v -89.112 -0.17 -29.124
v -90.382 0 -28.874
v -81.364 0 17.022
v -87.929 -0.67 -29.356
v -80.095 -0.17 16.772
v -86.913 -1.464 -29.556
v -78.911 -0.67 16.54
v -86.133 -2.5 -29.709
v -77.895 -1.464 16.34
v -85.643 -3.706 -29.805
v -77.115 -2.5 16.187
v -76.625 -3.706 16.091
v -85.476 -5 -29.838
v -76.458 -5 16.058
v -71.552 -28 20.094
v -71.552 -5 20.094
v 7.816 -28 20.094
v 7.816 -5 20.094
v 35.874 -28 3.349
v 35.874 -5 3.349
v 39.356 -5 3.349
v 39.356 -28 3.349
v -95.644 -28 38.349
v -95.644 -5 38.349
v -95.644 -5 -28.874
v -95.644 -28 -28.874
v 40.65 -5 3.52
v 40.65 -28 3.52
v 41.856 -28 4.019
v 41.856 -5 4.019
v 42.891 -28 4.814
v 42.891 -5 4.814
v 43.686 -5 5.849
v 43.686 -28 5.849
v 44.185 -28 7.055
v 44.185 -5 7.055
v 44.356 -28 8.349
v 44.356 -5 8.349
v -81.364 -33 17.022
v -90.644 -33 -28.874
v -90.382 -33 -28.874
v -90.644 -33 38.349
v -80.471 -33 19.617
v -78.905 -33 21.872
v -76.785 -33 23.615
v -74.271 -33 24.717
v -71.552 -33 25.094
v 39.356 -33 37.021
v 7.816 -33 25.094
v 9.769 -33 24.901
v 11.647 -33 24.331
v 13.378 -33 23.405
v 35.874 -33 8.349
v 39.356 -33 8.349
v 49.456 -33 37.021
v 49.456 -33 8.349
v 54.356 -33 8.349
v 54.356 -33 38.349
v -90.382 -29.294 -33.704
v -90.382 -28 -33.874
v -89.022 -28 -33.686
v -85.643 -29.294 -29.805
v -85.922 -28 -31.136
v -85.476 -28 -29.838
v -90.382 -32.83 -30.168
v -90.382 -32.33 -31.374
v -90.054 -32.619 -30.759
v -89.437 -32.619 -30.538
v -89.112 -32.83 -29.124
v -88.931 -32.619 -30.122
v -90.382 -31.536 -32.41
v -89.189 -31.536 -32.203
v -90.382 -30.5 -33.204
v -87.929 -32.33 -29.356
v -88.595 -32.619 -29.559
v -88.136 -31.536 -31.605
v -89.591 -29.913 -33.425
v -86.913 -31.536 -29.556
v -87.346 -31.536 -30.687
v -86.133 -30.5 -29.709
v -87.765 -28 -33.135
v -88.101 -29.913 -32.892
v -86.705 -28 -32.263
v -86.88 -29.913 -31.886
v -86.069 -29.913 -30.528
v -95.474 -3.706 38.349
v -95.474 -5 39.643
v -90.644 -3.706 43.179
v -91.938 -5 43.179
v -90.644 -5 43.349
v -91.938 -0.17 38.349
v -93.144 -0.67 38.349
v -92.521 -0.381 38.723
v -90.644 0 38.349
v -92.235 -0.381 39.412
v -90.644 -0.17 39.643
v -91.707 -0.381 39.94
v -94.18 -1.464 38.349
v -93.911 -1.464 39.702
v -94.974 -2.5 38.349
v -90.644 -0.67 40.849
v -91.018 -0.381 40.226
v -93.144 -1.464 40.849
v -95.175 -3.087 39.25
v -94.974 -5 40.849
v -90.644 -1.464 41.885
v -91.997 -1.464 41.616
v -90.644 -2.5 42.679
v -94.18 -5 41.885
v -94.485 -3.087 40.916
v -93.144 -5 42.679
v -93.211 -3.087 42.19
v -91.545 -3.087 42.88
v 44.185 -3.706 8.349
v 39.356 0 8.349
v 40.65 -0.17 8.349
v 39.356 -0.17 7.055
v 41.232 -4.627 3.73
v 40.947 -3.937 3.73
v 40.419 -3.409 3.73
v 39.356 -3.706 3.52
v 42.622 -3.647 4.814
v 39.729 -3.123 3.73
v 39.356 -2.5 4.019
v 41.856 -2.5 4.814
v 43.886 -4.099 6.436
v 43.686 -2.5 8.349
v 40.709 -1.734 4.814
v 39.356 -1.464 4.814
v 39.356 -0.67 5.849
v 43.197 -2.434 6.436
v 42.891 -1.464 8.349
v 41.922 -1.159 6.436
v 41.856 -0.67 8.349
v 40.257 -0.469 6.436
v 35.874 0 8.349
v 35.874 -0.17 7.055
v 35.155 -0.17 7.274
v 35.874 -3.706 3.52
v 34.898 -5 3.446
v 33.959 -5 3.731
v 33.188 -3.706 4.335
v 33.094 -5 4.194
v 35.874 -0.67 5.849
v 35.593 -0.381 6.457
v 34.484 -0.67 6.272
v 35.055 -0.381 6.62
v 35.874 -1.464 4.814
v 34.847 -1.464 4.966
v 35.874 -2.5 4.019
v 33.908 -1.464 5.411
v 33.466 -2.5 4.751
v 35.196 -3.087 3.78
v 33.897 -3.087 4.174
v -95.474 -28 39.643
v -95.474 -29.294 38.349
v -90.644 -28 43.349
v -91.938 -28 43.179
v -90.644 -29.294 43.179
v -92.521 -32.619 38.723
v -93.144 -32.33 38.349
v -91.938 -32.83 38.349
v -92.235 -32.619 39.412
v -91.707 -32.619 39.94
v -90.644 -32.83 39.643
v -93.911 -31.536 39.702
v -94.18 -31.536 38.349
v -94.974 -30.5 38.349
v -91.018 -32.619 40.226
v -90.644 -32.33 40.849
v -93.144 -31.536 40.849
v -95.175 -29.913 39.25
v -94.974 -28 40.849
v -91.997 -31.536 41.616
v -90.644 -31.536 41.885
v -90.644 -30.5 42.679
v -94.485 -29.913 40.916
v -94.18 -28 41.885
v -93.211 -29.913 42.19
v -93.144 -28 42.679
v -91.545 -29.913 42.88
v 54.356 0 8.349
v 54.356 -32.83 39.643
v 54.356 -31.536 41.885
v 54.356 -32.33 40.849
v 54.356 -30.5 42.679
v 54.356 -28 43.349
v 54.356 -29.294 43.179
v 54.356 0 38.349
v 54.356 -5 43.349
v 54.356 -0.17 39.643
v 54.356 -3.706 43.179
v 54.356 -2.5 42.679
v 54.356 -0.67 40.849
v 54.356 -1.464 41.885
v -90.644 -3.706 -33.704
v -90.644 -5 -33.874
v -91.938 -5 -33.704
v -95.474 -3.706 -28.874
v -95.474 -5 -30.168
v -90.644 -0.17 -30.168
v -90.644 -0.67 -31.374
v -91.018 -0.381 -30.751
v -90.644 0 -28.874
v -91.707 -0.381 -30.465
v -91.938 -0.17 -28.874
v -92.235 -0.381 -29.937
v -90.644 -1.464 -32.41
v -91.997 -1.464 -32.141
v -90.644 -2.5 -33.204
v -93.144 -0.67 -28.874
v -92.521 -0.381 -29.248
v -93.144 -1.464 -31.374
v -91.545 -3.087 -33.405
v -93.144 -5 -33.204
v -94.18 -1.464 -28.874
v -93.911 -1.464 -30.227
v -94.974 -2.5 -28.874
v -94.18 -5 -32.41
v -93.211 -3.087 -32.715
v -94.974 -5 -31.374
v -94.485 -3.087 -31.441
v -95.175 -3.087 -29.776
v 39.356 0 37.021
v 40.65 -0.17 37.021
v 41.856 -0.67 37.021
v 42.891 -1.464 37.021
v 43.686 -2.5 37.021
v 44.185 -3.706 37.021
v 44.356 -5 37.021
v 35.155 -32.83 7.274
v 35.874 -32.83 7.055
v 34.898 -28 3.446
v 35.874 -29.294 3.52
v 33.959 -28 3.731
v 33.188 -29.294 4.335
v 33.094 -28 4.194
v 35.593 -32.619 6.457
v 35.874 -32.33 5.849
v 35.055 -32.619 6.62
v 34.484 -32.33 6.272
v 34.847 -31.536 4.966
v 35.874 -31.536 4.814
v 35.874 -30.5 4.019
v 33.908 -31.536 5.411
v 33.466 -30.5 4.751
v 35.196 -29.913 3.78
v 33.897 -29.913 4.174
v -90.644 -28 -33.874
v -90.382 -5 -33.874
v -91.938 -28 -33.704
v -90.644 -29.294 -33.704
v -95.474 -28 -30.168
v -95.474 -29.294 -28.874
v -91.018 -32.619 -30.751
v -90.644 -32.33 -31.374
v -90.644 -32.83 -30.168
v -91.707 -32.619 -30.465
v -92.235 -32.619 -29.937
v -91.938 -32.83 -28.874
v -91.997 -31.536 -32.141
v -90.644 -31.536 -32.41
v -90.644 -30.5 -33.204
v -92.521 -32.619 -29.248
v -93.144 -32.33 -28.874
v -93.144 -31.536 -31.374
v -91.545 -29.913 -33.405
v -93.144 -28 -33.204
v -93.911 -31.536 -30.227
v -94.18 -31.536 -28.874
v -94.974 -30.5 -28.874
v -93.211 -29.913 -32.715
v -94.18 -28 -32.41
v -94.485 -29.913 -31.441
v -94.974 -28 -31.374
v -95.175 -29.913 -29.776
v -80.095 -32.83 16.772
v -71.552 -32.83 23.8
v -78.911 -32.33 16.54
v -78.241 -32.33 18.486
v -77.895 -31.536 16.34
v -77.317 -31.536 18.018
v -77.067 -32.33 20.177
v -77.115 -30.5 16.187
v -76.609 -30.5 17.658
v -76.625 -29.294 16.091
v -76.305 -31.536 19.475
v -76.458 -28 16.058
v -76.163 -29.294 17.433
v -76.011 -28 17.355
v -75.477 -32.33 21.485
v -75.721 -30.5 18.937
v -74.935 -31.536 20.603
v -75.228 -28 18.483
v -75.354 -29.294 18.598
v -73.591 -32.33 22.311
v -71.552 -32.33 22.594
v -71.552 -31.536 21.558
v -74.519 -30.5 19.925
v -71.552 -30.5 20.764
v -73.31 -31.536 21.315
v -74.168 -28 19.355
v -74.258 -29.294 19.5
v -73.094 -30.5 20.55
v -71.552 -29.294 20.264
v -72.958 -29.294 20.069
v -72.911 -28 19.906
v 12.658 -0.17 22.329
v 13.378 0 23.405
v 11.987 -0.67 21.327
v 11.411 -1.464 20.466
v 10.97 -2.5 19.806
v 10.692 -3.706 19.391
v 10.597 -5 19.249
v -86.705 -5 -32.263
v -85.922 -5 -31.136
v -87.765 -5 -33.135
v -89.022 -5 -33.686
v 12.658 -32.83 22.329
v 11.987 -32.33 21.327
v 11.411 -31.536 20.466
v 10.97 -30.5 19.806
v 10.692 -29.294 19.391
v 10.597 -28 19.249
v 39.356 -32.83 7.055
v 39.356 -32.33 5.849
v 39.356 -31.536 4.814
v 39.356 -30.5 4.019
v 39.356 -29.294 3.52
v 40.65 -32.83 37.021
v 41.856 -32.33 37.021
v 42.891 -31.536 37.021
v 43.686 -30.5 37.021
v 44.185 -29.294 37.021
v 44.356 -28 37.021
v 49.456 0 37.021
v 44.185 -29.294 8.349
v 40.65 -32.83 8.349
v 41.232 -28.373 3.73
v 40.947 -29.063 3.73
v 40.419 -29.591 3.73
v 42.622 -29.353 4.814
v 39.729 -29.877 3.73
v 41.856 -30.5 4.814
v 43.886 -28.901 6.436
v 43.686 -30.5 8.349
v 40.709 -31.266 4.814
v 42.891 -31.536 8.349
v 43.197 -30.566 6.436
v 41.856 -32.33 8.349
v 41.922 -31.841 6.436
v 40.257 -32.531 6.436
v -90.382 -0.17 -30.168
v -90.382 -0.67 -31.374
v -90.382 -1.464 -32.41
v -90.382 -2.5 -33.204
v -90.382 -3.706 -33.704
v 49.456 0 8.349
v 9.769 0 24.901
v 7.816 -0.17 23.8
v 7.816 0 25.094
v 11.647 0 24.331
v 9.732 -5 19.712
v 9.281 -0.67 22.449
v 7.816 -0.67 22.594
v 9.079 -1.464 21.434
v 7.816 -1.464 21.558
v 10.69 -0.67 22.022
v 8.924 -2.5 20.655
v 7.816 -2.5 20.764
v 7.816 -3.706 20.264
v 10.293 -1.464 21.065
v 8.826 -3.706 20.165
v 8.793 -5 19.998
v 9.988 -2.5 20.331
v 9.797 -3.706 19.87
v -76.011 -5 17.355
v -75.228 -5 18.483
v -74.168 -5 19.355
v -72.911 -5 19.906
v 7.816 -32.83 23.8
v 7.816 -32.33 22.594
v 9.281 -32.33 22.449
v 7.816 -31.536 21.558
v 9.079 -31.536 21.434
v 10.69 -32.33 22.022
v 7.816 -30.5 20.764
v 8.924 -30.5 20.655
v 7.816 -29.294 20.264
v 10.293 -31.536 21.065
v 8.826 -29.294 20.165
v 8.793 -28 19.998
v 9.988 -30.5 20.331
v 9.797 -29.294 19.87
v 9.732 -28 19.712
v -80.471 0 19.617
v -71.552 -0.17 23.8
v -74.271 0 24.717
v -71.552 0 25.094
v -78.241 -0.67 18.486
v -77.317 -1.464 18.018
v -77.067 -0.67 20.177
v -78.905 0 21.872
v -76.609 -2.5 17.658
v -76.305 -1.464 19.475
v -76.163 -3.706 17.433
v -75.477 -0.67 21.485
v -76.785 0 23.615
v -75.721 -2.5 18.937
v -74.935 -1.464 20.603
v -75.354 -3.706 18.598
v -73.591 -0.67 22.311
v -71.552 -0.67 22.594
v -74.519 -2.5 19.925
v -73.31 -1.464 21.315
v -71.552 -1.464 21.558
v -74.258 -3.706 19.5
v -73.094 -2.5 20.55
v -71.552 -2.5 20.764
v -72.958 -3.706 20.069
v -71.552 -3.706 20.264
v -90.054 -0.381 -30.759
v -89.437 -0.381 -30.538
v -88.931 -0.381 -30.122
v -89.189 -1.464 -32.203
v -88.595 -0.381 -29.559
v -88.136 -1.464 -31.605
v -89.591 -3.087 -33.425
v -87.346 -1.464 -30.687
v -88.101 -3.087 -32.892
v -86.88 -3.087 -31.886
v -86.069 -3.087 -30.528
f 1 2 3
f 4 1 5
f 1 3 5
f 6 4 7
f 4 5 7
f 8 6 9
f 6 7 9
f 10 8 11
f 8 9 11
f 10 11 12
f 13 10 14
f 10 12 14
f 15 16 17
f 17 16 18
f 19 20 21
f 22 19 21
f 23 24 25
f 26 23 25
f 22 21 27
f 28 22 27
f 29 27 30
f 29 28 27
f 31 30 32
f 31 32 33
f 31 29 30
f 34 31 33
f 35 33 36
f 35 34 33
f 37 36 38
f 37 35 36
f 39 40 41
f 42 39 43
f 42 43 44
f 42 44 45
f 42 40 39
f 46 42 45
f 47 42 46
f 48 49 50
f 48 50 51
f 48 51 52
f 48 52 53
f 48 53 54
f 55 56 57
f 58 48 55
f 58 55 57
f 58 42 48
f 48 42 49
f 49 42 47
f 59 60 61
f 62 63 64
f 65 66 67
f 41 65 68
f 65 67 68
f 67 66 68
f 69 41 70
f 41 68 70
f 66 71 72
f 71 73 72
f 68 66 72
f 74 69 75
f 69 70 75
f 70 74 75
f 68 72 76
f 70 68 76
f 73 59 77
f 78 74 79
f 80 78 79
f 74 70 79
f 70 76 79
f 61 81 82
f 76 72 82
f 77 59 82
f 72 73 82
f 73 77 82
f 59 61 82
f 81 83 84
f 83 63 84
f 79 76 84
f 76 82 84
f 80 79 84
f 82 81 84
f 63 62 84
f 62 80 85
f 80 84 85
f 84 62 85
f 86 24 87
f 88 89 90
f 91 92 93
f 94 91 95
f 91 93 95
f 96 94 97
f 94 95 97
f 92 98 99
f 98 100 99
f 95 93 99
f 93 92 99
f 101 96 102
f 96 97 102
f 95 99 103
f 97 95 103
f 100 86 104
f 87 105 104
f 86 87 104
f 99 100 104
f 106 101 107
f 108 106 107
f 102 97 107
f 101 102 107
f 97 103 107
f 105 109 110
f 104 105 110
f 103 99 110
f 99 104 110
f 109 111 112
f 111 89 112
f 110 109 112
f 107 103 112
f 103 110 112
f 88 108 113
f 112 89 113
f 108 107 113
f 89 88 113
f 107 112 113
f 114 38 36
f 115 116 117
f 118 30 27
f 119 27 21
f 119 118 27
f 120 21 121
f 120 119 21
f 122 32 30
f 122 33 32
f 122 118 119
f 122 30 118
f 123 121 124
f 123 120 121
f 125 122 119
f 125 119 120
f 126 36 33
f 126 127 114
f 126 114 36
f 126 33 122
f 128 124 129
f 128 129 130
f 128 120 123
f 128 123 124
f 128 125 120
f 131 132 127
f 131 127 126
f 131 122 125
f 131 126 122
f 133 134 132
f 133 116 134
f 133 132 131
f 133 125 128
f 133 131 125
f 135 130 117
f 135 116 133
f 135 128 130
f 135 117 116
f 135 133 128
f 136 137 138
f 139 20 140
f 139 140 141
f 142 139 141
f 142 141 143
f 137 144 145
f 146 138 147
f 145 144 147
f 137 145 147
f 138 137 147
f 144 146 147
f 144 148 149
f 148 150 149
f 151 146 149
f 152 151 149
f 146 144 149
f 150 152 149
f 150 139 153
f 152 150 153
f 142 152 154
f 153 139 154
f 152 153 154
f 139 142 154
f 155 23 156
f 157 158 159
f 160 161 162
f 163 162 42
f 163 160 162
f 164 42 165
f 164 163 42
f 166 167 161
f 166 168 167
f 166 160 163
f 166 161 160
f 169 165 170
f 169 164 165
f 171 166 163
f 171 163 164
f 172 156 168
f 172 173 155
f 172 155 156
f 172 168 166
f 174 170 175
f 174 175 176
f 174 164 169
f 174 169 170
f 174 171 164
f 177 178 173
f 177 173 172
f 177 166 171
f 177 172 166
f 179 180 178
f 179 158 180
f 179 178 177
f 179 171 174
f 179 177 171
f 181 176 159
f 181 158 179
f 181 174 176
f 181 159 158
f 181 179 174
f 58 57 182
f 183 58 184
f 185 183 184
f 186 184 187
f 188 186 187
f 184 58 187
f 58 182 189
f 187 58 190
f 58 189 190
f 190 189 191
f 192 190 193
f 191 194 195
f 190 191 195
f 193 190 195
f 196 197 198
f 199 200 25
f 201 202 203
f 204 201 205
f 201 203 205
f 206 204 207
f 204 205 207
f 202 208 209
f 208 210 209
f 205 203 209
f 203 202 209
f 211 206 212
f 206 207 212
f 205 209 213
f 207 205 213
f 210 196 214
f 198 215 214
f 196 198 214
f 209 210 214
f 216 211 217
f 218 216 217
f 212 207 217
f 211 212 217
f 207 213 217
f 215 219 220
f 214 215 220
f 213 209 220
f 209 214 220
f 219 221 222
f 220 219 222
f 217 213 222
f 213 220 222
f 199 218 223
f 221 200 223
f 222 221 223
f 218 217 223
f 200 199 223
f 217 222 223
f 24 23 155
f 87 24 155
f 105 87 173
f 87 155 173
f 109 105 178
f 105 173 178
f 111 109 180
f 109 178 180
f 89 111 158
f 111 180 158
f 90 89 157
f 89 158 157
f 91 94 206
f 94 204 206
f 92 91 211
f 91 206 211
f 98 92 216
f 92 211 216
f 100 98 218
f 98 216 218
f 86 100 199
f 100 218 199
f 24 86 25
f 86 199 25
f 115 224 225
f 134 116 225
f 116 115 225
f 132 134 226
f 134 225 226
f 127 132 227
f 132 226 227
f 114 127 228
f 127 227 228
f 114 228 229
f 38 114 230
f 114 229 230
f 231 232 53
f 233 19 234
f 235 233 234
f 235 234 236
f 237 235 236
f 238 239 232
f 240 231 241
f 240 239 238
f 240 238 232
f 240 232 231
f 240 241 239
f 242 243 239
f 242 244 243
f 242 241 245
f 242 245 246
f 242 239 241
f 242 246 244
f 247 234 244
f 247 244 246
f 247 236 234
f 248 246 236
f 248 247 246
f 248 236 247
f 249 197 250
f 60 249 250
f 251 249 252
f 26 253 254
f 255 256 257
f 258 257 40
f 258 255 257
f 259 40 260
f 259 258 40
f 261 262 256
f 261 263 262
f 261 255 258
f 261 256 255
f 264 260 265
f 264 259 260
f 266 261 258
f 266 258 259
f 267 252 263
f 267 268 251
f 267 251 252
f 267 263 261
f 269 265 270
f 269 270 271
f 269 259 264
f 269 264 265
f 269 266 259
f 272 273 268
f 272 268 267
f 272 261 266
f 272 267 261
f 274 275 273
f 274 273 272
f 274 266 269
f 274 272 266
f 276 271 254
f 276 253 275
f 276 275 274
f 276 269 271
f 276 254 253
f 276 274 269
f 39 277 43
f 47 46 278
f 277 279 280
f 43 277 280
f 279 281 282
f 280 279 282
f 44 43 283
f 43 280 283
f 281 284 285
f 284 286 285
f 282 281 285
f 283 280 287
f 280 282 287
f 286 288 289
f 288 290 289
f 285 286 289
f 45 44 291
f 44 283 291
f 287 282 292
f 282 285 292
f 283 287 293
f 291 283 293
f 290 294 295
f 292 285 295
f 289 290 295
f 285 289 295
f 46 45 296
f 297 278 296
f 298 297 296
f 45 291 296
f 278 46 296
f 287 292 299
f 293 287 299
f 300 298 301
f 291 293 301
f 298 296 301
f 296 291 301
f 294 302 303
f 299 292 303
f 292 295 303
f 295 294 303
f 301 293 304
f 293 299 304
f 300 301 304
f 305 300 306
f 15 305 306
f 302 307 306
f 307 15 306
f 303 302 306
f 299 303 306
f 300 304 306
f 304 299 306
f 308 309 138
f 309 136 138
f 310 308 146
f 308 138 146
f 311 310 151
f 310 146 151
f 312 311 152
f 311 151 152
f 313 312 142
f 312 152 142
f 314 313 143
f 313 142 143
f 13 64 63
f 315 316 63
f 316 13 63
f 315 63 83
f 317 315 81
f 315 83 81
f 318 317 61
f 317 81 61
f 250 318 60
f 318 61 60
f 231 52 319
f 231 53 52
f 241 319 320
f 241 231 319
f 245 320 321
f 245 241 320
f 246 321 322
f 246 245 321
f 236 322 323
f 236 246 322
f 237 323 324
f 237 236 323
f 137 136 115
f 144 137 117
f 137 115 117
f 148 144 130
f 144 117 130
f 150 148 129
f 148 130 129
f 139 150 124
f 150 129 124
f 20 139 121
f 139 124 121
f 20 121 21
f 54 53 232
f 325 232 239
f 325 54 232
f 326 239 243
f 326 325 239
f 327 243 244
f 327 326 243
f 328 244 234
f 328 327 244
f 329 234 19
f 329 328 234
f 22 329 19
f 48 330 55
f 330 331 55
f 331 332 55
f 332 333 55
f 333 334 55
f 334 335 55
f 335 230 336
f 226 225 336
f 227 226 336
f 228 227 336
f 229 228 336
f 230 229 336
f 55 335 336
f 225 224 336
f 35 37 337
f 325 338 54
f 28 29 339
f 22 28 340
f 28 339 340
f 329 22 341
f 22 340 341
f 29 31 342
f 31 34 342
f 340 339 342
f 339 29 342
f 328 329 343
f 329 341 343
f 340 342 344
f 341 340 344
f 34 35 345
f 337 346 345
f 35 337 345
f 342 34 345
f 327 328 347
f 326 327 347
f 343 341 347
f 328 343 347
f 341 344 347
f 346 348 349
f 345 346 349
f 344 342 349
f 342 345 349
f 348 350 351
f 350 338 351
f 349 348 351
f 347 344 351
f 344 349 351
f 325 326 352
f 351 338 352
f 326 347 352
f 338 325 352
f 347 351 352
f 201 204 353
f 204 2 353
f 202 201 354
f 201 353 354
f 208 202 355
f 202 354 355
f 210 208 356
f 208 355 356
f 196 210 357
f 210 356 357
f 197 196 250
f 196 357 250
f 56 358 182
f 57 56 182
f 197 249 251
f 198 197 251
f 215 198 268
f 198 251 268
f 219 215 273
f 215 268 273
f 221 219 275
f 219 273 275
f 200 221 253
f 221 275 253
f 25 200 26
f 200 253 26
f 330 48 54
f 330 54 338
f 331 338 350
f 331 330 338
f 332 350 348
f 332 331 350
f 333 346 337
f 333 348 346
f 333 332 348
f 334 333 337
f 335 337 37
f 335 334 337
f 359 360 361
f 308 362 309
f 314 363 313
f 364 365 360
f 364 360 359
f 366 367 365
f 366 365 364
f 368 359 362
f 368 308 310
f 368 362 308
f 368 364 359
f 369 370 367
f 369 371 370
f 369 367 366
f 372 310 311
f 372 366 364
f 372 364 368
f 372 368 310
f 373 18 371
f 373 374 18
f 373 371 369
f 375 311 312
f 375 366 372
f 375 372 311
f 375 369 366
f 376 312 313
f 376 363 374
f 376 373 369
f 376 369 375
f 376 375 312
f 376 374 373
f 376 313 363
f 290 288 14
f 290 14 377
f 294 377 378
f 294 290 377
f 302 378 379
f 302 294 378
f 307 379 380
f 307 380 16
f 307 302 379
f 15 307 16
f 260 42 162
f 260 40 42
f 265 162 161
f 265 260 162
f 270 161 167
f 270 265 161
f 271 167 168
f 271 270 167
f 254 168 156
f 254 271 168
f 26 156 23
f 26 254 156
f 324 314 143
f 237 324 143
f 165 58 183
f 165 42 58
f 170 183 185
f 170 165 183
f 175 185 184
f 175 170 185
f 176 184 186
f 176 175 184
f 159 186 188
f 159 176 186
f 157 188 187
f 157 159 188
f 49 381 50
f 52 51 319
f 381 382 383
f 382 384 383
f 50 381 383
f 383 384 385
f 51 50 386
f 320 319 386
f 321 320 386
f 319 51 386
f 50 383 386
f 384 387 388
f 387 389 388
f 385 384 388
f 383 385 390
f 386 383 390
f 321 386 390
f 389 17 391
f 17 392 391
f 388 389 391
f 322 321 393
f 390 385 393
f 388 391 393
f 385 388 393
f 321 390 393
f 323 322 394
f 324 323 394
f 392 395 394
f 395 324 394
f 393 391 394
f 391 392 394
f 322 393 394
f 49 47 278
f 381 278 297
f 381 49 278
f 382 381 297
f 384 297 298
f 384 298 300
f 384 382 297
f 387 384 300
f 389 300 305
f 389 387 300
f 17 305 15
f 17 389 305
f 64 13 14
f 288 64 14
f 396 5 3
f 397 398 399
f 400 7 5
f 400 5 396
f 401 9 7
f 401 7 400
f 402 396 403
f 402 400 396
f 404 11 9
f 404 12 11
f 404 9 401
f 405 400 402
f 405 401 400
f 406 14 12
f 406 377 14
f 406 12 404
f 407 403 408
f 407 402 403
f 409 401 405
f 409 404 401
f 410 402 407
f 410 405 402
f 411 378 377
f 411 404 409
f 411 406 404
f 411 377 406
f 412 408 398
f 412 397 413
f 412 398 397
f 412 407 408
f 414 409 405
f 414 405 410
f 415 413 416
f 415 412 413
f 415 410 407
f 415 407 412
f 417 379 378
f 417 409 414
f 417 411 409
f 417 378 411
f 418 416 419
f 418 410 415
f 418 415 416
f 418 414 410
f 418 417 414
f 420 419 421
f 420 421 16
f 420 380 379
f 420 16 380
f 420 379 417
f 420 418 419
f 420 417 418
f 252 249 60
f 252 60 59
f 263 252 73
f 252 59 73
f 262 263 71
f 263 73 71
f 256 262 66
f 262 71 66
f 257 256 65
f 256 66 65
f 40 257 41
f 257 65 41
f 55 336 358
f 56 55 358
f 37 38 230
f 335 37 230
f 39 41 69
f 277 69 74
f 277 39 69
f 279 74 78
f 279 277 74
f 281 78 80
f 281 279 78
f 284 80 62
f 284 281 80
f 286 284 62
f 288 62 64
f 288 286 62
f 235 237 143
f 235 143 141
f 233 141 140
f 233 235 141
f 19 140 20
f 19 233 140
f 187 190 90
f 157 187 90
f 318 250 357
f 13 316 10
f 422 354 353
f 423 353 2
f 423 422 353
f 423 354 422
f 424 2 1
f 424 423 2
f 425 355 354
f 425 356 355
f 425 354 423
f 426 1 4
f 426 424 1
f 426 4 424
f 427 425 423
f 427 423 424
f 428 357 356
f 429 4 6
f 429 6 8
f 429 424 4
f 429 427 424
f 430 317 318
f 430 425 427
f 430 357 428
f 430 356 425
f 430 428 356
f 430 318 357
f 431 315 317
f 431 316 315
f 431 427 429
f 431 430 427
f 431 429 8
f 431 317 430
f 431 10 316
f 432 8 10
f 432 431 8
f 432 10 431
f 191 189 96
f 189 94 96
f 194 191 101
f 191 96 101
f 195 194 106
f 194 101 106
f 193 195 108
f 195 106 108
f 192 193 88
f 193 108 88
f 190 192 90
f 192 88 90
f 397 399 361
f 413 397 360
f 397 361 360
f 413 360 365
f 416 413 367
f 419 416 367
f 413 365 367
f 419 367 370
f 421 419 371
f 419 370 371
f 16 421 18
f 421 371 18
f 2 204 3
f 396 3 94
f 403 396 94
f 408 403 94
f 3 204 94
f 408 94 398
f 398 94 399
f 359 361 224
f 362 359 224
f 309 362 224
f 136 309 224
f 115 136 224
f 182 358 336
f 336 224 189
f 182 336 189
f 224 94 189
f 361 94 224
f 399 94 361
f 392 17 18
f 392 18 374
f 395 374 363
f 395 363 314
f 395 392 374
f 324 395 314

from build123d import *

# Parameters (mm, degrees)
F1_DEPTH = 33
F2_F1_R  = 5
F2_F2_R  = 5


with BuildPart() as f1:
    # F0 (on Front) → F1 (new body)
    with BuildSketch(Plane.XZ):
        Polygon((44.3557138985, 43.3492468083), (-95.6442861015, 43.3492468083), (-95.6442861015, -33.8743397176), (-86.2685606181, -33.8743397176), (-75.6651710416, 20.0938743485), (9.3348289584, 20.0938743485), (34.3557138985, 3.3492468083), (44.3557138985, 3.3492468083), (44.3557138985, 37.0205976069), align=None)
        Polygon((54.3557138985, 43.3492468083), (44.3557138985, 43.3492468083), (44.3557138985, 37.0205976069), (49.4557138985, 37.0205976069), (49.4557138985, 8.3492468083), (54.3557138985, 8.3492468083), align=None)
    extrude(amount=F1_DEPTH)

    # F2: fillet of radius 5 on 19 edges, made by hand

    # F2_f1
    f2_f1_edges = [f1.edges().sort_by_distance(p)[0] for p in [
        (-75.6651710416, -16.5, 20.0938743485),
        (9.3348289584, -16.5, 20.0938743485),
    ]]
    fillet(f2_f1_edges, radius=F2_F1_R)

    # F2_f2
    f2_f2_edges = [f1.edges().sort_by_distance(p)[0] for p in [
        (-31.8679165952, 0, 20.0938743485),
        (-31.8679165952, -33, 20.0938743485),
        (-95.6442861015, -16.5, -33.8743397176),
        (-86.2685606181, -16.5, -33.8743397176),
        (-90.9564233598, 0, -33.8743397176),
        (-90.9564233598, -33, -33.8743397176),
        (-95.6442861015, -16.5, 43.3492468083),
        (-95.6442861015, 0, 4.7374535453),
        (-95.6442861015, -33, 4.7374535453),
        (-20.6442861015, 0, 43.3492468083),
        (-20.6442861015, -33, 43.3492468083),
        (34.3557138985, -16.5, 3.3492468083),
        (44.3557138985, -33, 20.1849222076),
        (44.3557138985, 0, 20.1849222076),
        (44.3557138985, -16.5, 3.3492468083),
        (39.3557138985, 0, 3.3492468083),
        (39.3557138985, -33, 3.3492468083),
        (-74.7284504953, -33, 18.9552032994),
        (9.2692742039, -33, 19.8780504751),
        (-74.7284504953, 0, 18.9552032994),
        (9.2692742039, 0, 19.8780504751),
    ]]
    fillet(f2_f2_edges, radius=F2_F2_R)


solid = f1.part
